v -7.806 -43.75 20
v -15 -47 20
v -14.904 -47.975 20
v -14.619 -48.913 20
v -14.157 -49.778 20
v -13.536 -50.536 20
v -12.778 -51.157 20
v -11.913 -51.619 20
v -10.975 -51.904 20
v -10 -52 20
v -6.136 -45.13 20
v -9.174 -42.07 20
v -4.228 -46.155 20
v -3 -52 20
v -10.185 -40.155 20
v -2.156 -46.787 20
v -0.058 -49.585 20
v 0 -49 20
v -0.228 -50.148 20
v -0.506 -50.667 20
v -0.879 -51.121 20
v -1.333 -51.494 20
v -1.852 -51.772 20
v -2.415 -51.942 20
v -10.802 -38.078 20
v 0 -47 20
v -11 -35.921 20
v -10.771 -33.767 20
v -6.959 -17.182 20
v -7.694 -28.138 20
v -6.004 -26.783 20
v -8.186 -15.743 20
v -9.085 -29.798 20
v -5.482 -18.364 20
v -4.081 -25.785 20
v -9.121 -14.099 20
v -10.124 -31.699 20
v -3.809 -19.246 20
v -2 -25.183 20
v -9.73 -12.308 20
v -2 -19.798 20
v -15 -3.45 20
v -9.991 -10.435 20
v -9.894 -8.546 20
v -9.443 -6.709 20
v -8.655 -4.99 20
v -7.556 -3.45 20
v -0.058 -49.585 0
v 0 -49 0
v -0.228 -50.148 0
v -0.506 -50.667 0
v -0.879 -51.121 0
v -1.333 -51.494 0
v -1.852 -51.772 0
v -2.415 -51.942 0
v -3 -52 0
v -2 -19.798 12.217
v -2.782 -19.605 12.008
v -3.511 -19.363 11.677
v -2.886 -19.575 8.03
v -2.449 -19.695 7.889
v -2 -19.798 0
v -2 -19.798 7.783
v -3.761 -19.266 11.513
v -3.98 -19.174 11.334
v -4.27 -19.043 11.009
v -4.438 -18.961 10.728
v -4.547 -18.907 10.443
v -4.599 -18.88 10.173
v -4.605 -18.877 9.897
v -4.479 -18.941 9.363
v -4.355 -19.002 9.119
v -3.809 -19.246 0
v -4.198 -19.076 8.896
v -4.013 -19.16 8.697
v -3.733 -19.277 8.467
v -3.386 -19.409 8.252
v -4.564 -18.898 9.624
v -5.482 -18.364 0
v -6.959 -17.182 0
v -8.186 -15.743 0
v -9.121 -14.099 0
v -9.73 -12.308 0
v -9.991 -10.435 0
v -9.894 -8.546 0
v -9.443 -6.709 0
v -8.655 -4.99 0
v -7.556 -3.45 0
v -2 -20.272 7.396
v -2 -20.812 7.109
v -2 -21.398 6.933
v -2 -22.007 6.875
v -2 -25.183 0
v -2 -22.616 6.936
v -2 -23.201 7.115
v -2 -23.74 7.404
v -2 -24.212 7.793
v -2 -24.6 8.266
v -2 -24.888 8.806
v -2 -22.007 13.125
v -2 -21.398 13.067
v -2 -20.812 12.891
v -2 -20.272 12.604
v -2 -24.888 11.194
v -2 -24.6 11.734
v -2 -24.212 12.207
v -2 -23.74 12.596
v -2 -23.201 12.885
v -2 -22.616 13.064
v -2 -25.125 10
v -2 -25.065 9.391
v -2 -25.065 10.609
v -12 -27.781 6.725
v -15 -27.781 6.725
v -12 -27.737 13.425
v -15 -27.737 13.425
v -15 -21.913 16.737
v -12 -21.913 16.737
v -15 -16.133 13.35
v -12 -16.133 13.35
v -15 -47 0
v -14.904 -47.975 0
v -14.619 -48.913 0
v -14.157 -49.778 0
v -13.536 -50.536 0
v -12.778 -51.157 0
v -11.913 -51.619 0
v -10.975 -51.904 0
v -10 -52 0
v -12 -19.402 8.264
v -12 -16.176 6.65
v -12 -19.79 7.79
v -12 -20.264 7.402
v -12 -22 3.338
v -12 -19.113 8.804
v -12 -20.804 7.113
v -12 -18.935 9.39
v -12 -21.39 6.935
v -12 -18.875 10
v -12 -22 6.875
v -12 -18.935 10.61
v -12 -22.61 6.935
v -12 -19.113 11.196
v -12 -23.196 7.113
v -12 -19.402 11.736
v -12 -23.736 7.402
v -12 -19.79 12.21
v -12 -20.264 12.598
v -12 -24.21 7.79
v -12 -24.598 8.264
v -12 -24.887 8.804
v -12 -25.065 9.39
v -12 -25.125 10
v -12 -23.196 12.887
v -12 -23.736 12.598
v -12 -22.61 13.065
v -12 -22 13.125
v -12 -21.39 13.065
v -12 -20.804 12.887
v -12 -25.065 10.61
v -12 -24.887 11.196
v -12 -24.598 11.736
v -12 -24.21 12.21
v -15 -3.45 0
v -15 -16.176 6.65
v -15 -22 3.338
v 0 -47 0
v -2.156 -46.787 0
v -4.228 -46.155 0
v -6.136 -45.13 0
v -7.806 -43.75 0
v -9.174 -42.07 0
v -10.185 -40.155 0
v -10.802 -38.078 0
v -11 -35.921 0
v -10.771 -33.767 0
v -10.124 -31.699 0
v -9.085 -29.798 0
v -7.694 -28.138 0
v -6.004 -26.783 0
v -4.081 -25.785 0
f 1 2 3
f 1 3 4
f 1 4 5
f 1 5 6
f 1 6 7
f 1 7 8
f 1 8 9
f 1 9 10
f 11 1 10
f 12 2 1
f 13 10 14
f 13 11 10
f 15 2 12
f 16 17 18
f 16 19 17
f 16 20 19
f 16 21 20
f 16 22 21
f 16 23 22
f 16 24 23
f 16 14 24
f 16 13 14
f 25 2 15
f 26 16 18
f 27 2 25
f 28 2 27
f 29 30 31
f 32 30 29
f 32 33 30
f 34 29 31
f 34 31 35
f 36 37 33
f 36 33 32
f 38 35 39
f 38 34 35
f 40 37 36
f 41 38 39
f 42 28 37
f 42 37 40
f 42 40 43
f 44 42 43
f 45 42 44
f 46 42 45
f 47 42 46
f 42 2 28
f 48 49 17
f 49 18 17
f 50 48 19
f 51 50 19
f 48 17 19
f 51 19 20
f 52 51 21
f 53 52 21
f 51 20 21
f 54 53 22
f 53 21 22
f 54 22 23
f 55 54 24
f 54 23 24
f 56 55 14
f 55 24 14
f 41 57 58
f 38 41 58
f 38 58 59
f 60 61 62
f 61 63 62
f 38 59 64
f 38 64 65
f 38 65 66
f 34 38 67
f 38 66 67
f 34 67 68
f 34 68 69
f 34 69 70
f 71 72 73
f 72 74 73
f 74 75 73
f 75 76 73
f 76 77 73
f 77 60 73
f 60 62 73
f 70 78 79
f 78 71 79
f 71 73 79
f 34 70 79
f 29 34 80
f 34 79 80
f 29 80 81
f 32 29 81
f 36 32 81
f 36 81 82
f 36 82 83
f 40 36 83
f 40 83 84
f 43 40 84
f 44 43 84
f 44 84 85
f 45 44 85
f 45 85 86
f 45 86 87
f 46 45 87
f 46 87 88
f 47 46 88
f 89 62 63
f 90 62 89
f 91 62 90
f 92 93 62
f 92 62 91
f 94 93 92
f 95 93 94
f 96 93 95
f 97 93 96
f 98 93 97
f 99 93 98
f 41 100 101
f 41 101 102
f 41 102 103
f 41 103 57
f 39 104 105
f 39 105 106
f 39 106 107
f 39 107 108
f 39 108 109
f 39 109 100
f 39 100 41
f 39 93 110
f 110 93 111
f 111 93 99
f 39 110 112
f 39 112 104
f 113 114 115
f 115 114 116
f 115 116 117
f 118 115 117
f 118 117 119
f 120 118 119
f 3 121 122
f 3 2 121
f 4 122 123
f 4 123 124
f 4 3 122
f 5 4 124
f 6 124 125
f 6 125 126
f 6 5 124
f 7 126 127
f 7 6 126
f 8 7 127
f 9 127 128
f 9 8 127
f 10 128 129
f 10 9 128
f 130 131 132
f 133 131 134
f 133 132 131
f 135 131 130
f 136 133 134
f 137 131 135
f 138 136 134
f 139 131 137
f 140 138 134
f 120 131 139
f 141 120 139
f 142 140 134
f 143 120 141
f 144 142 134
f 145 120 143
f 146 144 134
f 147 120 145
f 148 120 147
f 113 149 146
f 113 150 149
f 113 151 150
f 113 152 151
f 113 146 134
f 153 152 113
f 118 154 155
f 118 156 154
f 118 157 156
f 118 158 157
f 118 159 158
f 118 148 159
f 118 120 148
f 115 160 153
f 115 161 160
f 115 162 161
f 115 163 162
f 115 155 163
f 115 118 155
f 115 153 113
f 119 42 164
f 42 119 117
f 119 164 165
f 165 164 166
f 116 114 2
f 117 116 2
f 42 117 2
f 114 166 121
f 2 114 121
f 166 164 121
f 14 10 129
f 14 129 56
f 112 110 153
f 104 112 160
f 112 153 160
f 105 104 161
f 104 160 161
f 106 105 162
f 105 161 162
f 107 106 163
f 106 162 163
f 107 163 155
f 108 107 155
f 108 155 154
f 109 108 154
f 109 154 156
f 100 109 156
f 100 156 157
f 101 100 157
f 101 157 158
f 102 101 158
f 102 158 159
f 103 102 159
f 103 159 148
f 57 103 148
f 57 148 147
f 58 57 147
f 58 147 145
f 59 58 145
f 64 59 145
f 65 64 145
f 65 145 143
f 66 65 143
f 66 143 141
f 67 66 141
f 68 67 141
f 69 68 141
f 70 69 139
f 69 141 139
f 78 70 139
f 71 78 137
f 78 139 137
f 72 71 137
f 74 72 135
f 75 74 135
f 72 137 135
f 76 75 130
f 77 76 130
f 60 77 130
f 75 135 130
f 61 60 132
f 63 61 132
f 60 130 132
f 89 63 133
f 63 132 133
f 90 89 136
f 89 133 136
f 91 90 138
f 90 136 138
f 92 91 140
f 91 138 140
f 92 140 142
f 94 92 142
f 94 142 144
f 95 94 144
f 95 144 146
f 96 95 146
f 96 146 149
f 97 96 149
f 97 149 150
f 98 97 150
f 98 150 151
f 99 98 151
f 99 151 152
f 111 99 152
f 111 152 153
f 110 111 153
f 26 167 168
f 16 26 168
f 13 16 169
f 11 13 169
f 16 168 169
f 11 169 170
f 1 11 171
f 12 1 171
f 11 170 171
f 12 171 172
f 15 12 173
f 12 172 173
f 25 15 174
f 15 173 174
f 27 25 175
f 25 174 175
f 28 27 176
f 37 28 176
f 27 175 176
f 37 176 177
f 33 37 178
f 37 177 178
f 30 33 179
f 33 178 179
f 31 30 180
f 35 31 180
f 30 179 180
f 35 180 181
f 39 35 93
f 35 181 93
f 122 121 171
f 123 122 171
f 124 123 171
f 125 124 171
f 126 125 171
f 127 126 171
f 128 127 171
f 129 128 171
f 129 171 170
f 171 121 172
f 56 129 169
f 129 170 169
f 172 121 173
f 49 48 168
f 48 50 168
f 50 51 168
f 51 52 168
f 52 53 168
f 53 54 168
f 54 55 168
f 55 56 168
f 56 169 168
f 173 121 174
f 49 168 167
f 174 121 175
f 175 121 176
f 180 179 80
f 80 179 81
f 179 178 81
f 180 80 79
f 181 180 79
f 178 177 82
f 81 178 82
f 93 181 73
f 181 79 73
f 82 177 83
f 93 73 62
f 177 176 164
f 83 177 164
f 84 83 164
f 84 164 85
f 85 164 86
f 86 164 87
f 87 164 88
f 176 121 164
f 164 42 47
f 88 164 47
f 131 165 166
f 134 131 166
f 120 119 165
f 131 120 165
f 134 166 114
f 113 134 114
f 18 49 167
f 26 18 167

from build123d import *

# Parameters (mm, degrees)
F1_DEPTH  = 20
F2_DEPTH  = 20
F3_DEPTH  = 1
F4_DEPTH  = 2
F5_R      = 5
F6_R      = 3.125
F7_DEPTH  = 3
F9_DEPTH  = 20
F10_DEPTH = 2
F11_DEPTH = 0.2030410289
F12_DEPTH = 0.1843461736
F13_R     = 3
F14_DEPTH = 13


with BuildPart() as f1:
    # F0 (on Top) → F1 (new body)
    with BuildSketch(Plane.XY):
        with BuildLine():
            Line((-15, -22.5), (0, -22.5))
            Line((0, -22.5), (0, -20))
            ThreePointArc((0, -20), (-10, -10), (0, 0))
            Line((0, 0), (0, 6))
            Line((0, 6), (-15, 6))
            Line((-15, 6), (-15, -22.5))
        make_face()
    extrude(amount=F1_DEPTH)

    # F0 (on Top) → F2 (join)
    with BuildSketch(Plane.XY):
        with BuildLine():
            ThreePointArc((0, -47), (-11, -36), (0, -25))
            Line((0, -25), (0, -22.5))
            Line((0, -22.5), (-15, -22.5))
            Line((-15, -22.5), (-15, -52))
            Line((-15, -52), (0, -52))
            Line((0, -52), (0, -47))
        make_face()
    extrude(amount=F2_DEPTH)

    # F3 (cut): a face of the model
    f3_faces = [f1.faces().sort_by_distance(p)[0] for p in [
        (0, 3, 10),
    ]]
    extrude(f3_faces, amount=-F3_DEPTH, mode=Mode.SUBTRACT)

    # F4 (cut): a face of the model
    f4_faces = [f1.faces().sort_by_distance(p)[0] for p in [
        (-0.5, 0, 10),
    ]]
    extrude(f4_faces, amount=-F4_DEPTH, mode=Mode.SUBTRACT)

    # F5
    f5_edges = [f1.edges().sort_by_distance(p)[0] for p in [
        (-15, -52, 10),
    ]]
    fillet(f5_edges, radius=F5_R)

    # F6 (on face) → F7 (cut)
    with BuildSketch(Plane(origin=(-15, 0, 0), x_dir=(0, -1, 0), z_dir=(-1, 0, 0))):
        Polygon((16.1327298143, 13.3499298867), (16.1760774277, 6.6500701133), (22, 3.3376803609), (27.7805749589, 6.725150382), (27.7372273456, 13.4250101555), (21.9133047732, 16.7373999079), align=None)
        with Locations((22, 10)):
            Circle(F6_R, mode=Mode.SUBTRACT)
    extrude(amount=-F7_DEPTH, mode=Mode.SUBTRACT)

    # F8 (on face) → F9 (cut, through all)
    with BuildSketch(Plane.XY.offset(20)):
        with BuildLine():
            Line((-15, 6), (-15, -3.4501256289))
            Line((-15, -3.4501256289), (-7.5563976684, -3.4501256289))
            ThreePointArc((-7.5563976684, -3.4501256289), (-4.6035839587, -1.1226684902), (-1, -0.0501256289))
            Line((-1, -0.0501256289), (-1, 6))
            Line((-1, 6), (-15, 6))
        make_face()
    extrude(amount=-F9_DEPTH, mode=Mode.SUBTRACT)

    # F10 (cut): a face of the model
    f10_faces = [f1.faces().sort_by_distance(p)[0] for p in [
        (0, -22.5, 10),
    ]]
    extrude(f10_faces, amount=-F10_DEPTH, mode=Mode.SUBTRACT)

    # F11 (cut, through all): a face of the model
    f11_faces = [f1.faces().sort_by_distance(p)[0] for p in [
        (-1, -20, 10),
    ]]
    extrude(f11_faces, amount=-F11_DEPTH, mode=Mode.SUBTRACT)

    # F12 (cut, through all): a face of the model
    f12_faces = [f1.faces().sort_by_distance(p)[0] for p in [
        (-1, -25, 10),
    ]]
    extrude(f12_faces, amount=-F12_DEPTH, mode=Mode.SUBTRACT)

    # F13
    f13_edges = [f1.edges().sort_by_distance(p)[0] for p in [
        (0, -52, 10),
    ]]
    fillet(f13_edges, radius=F13_R)

    # F14 (cut, through all): a face of the model
    f14_faces = [f1.faces().sort_by_distance(p)[0] for p in [
        (-15, -22, 10),
    ]]
    extrude(f14_faces, amount=-F14_DEPTH, mode=Mode.SUBTRACT)


solid = f1.part
